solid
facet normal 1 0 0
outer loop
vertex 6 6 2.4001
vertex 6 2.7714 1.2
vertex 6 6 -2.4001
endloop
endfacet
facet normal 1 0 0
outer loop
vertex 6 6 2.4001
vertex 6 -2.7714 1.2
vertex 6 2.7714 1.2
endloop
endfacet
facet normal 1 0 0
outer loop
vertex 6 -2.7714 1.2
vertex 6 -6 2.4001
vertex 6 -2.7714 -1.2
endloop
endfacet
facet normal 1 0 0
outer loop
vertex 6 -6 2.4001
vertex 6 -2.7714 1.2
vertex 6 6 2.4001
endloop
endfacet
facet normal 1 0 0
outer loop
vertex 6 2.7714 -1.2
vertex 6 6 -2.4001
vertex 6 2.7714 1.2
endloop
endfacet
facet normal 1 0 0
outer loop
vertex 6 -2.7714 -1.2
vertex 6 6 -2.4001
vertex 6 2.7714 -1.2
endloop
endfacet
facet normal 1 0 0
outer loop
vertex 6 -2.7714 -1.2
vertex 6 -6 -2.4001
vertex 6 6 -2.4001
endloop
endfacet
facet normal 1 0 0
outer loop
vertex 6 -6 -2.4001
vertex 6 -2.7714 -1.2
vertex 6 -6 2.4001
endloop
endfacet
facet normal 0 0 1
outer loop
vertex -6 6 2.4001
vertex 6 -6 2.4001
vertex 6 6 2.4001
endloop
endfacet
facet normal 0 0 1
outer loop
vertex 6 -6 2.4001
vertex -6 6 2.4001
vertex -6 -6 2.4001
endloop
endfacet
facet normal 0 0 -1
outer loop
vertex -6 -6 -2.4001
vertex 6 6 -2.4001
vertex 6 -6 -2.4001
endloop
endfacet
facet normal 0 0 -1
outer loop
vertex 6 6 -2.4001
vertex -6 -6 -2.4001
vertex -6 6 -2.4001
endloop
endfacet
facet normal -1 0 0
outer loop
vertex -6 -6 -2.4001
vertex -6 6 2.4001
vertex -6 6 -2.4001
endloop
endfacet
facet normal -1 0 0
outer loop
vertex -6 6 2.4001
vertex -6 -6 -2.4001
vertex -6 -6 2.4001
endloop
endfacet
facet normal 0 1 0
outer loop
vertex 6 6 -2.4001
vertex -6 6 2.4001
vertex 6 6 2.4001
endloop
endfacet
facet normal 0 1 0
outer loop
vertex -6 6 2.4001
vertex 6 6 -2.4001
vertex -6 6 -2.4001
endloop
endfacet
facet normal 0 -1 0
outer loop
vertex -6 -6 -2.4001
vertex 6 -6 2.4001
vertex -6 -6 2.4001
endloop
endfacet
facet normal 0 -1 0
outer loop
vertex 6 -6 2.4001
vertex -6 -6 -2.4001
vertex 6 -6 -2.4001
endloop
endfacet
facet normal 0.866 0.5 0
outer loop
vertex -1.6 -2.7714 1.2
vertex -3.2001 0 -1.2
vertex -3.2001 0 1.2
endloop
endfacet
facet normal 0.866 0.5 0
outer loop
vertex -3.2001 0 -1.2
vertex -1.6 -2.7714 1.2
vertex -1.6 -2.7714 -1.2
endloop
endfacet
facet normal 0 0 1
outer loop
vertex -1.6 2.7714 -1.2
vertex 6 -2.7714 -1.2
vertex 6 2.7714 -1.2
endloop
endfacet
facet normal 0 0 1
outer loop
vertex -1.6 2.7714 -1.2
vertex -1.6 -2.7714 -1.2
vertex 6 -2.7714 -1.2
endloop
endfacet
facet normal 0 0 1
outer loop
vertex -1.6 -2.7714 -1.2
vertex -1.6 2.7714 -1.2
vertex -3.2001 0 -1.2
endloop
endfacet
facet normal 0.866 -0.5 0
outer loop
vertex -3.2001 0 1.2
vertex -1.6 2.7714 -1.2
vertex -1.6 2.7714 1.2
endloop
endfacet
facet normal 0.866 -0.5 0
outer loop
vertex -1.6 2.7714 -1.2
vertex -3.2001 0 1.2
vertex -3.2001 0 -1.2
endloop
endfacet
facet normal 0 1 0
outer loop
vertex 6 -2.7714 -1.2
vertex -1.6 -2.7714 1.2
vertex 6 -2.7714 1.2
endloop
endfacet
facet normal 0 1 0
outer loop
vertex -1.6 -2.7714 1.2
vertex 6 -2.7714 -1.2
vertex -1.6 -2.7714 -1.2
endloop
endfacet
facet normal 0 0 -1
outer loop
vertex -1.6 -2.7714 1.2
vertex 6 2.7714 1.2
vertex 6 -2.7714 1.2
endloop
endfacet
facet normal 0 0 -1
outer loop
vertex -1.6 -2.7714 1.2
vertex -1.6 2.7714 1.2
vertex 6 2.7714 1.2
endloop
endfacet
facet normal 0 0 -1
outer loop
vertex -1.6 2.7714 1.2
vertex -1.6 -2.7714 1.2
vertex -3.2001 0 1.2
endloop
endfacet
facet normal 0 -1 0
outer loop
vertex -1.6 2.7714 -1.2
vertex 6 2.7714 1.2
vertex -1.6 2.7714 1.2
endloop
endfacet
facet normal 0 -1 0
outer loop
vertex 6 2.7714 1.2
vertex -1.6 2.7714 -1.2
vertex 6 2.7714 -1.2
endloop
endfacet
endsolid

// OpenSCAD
include <MCAD/nuts_and_bolts.scad>

module nutTrap(size, offset, tolerance = +0.0001)
{
    radius = METRIC_NUT_AC_WIDTHS[size]/2+tolerance;
	height = METRIC_NUT_THICKNESS[size]+tolerance;
    apothem = radius*sin(60);

    translate([0, 0, -height/2])
    {
        hull()
        {
            translate([offset, -apothem, 0])
            {
        		cube([0.1, 2*apothem, height]);
        	}

            cylinder(r=radius, h=height, $fn = 6);
        }
    }
}

module nutTrapTest(size, offset, tolerance = +0.0001)
{
    height = 2*(METRIC_NUT_THICKNESS[size]+tolerance);
    width = 2*offset;

    difference()
    {
        cube([width, width, height], true);
        translate([0, 0, 0])
        {
            nutTrap(size, offset, tolerance);
        }
    }
}

nutTrapTest(3, 6);
